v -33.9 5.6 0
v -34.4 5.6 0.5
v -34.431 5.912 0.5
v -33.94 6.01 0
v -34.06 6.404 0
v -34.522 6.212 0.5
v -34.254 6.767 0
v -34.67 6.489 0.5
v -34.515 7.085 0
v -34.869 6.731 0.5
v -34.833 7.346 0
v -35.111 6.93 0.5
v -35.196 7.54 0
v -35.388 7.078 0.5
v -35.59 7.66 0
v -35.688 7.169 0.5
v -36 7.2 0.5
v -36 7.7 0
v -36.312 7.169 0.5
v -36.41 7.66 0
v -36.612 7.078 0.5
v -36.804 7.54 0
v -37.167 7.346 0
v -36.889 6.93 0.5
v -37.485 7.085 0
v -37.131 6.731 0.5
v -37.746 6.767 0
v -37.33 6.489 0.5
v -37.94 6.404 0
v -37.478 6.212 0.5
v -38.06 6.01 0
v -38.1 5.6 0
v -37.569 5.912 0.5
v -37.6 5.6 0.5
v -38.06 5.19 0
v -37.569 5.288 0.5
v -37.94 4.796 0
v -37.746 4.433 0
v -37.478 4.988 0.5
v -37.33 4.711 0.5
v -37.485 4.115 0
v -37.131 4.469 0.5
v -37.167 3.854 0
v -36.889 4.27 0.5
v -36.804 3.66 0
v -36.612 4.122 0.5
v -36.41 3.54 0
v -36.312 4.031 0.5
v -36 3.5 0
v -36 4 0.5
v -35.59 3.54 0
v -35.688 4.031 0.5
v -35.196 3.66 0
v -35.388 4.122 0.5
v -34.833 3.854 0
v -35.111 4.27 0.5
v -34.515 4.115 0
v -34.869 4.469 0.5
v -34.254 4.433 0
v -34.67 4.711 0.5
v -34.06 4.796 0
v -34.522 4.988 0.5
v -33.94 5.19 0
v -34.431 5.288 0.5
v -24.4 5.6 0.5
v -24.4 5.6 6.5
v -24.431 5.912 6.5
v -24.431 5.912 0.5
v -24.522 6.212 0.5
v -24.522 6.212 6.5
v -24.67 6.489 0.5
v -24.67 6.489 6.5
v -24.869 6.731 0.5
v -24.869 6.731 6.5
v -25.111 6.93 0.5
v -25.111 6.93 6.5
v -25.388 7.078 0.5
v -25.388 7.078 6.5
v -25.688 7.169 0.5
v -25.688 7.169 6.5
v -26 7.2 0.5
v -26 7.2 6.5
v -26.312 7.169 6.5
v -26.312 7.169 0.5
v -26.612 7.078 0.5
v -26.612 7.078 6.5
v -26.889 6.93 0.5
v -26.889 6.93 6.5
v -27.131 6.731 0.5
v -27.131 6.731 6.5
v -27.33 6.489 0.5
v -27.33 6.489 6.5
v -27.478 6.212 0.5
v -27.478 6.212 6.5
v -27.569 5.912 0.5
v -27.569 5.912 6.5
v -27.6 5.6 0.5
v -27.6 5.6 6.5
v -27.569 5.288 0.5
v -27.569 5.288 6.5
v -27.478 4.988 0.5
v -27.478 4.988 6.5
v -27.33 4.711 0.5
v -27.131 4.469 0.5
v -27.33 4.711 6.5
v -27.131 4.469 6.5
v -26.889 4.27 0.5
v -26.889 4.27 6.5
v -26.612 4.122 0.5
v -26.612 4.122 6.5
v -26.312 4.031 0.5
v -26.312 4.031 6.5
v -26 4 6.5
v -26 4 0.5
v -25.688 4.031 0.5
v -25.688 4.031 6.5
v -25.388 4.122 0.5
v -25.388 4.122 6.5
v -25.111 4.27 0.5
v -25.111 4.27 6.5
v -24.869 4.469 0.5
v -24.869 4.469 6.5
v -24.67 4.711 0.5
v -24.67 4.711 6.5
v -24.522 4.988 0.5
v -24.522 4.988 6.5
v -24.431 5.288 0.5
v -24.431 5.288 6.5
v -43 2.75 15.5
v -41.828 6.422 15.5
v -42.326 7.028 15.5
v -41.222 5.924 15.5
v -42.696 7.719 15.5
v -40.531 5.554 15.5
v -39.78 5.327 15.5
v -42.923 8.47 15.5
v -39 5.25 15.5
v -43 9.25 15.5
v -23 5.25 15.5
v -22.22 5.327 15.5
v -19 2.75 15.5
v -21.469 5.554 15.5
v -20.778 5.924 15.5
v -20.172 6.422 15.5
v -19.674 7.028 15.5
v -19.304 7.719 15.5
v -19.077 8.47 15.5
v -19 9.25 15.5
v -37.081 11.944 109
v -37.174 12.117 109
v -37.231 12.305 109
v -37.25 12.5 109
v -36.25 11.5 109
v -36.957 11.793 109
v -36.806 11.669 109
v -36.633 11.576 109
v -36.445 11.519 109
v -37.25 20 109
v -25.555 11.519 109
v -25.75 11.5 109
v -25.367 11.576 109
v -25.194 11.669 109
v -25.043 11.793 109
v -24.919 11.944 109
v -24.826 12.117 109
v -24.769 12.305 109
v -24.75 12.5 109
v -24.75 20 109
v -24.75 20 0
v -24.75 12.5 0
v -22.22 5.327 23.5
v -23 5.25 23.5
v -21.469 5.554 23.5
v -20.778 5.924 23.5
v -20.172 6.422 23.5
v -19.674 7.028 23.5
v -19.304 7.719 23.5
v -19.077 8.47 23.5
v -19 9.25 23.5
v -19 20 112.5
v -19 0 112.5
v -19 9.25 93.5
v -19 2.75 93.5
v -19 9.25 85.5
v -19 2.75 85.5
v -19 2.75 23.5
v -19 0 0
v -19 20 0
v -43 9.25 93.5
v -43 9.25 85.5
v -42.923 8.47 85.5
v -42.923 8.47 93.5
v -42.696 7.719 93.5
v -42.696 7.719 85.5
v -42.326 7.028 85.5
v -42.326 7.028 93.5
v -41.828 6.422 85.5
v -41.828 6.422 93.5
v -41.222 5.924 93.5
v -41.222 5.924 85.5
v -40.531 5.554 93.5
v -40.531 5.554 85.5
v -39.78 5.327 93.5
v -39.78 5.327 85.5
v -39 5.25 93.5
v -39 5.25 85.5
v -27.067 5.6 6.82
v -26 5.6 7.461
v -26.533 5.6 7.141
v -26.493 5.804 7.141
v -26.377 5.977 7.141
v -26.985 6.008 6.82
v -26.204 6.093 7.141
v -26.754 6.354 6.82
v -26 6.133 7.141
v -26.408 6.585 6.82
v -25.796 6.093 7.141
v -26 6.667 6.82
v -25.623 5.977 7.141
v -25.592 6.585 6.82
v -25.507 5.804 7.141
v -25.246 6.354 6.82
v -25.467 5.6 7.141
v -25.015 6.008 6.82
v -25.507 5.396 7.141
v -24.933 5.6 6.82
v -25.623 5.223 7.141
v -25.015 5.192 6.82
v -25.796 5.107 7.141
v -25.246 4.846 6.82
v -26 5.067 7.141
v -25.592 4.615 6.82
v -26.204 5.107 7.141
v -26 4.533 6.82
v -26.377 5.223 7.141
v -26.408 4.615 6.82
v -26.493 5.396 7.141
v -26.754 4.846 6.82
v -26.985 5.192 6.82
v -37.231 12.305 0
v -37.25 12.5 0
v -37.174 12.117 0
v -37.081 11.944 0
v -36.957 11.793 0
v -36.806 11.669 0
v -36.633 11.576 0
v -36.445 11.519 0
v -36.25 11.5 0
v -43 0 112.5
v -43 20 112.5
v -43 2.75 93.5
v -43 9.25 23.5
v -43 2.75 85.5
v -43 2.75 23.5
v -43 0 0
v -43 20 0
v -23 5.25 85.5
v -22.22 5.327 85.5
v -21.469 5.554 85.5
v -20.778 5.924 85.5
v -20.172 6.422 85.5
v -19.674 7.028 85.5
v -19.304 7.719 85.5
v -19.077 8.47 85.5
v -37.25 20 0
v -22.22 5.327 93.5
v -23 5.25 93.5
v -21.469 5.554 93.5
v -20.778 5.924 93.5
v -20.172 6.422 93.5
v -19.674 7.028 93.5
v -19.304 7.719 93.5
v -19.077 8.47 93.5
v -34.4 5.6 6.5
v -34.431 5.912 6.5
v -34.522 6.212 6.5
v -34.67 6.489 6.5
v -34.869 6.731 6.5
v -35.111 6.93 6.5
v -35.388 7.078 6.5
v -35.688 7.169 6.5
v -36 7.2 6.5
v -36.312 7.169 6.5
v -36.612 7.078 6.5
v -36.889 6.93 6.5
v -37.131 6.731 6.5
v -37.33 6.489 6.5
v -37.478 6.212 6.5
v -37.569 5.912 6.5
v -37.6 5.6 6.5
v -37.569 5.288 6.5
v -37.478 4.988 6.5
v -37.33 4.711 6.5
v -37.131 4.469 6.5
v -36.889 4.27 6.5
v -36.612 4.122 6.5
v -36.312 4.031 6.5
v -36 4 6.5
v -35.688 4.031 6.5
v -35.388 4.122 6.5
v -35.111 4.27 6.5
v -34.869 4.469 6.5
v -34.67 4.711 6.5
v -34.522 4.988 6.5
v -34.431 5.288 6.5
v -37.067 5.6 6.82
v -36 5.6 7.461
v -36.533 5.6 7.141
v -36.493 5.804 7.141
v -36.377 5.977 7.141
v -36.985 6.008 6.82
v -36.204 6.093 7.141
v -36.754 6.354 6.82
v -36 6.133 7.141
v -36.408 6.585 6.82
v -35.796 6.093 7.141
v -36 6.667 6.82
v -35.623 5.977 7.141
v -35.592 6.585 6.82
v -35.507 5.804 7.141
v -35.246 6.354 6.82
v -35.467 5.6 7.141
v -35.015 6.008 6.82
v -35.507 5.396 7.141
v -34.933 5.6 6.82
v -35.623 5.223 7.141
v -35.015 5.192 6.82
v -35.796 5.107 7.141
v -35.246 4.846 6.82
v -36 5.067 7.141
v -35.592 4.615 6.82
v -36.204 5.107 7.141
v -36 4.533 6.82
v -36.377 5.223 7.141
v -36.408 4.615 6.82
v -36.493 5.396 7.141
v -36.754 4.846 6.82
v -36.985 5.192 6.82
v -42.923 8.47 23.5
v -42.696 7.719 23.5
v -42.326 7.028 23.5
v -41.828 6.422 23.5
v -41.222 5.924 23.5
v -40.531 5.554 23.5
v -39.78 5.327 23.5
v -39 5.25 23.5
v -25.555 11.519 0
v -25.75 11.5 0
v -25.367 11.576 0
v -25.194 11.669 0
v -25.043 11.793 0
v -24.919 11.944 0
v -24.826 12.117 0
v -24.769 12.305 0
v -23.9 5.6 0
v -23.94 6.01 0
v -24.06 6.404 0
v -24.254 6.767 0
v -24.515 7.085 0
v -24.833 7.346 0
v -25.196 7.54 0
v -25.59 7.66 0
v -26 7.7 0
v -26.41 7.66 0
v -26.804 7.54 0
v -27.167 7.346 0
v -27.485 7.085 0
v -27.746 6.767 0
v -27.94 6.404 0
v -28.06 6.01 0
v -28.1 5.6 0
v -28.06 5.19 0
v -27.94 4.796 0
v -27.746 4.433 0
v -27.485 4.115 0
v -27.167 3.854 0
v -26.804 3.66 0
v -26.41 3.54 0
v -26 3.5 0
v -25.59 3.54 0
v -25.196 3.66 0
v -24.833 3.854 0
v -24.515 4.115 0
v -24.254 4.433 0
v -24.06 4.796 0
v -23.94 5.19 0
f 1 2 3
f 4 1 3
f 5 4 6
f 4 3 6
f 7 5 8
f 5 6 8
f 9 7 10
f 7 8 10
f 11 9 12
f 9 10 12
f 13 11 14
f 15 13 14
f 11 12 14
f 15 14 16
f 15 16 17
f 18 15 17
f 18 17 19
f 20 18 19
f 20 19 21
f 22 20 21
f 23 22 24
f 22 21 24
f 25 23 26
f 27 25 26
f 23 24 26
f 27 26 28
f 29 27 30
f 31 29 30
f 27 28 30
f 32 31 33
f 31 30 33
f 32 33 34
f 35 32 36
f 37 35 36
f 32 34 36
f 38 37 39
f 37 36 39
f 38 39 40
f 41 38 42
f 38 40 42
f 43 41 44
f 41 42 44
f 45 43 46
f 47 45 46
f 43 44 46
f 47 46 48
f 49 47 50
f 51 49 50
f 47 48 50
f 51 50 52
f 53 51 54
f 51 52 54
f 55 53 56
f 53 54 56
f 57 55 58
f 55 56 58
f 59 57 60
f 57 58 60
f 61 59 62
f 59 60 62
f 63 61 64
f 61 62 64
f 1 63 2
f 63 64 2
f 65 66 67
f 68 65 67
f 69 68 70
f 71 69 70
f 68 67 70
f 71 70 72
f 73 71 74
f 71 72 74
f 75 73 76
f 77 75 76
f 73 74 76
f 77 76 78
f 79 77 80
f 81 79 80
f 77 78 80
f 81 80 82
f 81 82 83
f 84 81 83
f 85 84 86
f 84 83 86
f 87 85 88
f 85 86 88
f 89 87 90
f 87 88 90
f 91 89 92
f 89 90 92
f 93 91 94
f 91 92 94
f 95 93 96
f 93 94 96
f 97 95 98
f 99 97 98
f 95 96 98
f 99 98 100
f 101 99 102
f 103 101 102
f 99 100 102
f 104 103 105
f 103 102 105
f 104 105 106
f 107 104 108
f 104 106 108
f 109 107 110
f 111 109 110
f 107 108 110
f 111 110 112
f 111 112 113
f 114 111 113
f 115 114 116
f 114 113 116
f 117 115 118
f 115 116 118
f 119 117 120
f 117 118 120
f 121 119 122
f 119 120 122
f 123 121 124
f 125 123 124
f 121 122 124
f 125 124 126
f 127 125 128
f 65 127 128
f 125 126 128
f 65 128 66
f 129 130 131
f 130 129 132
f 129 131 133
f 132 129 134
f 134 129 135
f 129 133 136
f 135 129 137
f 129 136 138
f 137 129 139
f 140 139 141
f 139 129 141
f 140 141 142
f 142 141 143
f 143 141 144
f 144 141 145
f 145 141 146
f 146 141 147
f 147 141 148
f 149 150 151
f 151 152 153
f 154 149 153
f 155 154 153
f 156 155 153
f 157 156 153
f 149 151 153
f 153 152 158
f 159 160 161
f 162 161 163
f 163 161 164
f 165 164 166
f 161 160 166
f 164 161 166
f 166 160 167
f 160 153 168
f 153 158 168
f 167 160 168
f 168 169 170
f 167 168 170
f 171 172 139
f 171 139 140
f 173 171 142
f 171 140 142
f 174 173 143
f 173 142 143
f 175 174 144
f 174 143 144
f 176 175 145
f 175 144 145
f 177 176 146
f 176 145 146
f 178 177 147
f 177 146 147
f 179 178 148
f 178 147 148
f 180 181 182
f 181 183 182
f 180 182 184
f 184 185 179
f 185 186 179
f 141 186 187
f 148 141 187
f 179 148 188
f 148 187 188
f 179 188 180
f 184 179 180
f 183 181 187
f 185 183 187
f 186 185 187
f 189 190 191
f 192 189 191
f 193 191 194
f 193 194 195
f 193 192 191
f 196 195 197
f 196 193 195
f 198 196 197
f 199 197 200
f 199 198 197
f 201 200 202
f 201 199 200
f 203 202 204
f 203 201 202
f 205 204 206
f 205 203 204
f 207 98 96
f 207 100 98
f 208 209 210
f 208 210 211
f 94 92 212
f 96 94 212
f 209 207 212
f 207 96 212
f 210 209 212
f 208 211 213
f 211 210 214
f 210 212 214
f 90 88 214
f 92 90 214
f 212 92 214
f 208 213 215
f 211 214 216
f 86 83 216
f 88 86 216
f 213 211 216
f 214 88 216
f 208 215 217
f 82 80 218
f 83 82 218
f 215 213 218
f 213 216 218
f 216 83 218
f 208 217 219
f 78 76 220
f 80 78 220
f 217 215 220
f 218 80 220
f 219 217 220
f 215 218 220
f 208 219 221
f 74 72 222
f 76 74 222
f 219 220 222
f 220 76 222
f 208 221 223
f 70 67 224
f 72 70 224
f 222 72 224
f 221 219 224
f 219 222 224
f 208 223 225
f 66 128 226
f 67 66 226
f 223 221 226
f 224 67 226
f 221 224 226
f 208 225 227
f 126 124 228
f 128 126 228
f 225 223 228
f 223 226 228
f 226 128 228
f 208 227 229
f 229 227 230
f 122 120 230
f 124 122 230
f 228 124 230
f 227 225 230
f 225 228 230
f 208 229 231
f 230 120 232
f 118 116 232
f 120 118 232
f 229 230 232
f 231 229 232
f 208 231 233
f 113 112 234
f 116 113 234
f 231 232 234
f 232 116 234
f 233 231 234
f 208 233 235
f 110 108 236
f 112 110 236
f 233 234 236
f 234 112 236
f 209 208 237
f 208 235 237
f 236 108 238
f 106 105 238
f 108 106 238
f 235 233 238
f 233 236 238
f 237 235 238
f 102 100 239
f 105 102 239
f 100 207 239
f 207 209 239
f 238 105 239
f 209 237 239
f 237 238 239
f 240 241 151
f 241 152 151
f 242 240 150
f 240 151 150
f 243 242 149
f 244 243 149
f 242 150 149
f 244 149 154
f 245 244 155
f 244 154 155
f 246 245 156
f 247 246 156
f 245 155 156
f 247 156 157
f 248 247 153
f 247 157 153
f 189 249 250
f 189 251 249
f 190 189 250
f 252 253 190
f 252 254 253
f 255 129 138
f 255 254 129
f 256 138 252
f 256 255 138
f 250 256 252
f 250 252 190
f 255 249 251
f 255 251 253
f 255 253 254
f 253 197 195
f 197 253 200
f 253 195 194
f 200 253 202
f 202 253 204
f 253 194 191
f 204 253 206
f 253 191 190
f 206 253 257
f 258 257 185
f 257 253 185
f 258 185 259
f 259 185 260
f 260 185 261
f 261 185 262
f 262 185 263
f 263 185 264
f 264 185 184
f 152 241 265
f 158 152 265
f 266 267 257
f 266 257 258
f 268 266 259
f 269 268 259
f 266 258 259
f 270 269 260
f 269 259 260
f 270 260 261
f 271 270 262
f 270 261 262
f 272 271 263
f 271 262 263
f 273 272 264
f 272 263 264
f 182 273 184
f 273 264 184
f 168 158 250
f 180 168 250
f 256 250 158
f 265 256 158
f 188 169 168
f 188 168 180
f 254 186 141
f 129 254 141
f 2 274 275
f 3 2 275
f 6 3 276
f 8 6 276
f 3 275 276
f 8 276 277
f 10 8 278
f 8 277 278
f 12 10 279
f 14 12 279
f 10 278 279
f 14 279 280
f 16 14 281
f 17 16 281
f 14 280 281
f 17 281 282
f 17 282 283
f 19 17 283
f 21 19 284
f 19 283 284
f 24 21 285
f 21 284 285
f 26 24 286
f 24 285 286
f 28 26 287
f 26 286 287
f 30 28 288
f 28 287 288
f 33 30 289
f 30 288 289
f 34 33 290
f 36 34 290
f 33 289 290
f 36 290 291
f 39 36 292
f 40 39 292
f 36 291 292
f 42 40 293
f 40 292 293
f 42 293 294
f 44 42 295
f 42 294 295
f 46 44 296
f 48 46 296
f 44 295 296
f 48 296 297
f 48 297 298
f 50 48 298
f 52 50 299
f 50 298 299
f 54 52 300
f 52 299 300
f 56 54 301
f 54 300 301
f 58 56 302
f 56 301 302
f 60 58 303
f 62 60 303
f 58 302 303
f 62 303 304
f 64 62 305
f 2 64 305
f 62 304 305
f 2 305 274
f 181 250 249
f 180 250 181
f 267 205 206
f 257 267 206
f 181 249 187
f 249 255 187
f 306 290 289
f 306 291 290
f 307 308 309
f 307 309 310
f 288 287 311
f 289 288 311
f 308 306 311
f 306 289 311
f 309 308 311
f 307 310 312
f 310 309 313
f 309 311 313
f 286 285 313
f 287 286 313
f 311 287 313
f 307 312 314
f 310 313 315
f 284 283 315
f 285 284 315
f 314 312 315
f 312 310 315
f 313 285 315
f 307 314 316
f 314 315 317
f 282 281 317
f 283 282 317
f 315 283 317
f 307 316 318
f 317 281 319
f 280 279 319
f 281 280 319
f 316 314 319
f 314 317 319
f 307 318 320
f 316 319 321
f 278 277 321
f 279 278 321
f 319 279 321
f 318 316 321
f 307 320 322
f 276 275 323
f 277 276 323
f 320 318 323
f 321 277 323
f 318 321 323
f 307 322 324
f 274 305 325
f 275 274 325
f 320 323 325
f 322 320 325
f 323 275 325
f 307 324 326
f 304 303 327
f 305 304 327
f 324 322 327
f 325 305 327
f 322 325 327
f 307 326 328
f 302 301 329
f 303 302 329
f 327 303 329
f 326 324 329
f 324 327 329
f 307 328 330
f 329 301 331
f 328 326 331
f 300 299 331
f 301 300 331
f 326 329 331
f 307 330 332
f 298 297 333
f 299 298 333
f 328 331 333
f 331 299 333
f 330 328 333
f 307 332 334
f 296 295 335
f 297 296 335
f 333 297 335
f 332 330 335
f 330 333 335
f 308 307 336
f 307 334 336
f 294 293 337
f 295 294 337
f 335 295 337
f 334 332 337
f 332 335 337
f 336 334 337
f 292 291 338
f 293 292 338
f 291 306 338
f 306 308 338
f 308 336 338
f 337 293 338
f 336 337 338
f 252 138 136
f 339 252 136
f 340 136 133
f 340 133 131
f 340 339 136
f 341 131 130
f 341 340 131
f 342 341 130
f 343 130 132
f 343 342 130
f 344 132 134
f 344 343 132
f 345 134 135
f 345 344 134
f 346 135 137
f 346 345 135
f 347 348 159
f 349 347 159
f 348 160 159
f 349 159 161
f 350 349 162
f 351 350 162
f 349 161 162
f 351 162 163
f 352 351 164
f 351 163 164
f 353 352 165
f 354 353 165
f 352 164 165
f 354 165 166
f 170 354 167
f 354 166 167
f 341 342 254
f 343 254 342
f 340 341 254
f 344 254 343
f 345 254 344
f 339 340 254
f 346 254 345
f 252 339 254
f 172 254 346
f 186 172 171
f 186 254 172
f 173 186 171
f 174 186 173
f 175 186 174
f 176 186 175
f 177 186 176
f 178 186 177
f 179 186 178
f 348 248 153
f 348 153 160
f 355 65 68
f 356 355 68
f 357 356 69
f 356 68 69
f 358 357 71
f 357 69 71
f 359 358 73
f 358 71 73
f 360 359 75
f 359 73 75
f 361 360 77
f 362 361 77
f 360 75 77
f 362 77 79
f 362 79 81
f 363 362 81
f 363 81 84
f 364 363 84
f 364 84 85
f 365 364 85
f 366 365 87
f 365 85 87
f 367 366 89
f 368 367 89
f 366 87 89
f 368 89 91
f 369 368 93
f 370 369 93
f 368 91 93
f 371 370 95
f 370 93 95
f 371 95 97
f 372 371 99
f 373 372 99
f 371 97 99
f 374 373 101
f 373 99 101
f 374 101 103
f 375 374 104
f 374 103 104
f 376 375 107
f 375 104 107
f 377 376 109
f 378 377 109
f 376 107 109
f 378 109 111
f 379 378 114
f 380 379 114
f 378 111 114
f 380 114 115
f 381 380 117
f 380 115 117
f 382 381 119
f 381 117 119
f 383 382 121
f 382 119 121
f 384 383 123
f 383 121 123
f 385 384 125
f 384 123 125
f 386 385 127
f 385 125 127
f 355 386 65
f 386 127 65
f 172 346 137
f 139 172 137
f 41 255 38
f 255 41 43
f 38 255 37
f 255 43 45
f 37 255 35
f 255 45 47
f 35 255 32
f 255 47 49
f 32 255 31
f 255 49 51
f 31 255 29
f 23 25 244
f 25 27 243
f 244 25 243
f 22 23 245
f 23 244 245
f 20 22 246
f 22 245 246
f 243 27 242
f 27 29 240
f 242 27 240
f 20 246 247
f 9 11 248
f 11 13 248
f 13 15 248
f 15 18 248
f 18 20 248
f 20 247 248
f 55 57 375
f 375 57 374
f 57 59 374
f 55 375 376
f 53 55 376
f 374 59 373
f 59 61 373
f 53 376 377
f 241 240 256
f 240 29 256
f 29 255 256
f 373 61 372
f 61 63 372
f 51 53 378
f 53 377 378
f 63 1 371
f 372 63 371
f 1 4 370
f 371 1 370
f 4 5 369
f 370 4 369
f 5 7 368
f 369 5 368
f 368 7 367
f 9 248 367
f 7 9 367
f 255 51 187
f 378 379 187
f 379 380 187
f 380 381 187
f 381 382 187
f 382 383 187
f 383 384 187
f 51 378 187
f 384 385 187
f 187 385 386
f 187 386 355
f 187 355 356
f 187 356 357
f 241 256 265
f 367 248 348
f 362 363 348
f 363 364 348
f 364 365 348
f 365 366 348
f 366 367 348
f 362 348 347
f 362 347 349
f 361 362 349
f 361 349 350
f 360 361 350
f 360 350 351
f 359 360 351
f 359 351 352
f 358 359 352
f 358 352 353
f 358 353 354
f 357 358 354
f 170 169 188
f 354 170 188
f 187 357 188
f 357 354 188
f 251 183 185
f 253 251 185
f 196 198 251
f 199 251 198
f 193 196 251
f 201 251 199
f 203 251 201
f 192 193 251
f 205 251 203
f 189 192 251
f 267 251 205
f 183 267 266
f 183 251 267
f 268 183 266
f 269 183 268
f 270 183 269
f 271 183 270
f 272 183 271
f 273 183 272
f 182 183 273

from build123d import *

# Parameters (mm, degrees)
SKETCH1_W                 = 12.5
SKETCH1_H                 = 11.5
BOSS_EXTRUDE1_DEPTH       = 109
SKETCH2_W                 = 24
SKETCH2_H                 = 20
BOSS_EXTRUDE2_DEPTH       = 3.5
F_2_5MM_DOWEL_HOLE1_D     = 3.2
F_2_5MM_DOWEL_HOLE1_DEPTH = 6.5
F_2_5MM_DOWEL_HOLE1_TIP   = 0.96137699
SKETCH5_W                 = 8
SKETCH5_H                 = 2.5
CUT_EXTRUDE1_DEPTH        = 117.757226757
FILLET1_R                 = 4
CHAMFER1_SIZE             = 0.5
FILLET2_R                 = 1


with BuildPart() as part:
    # Sketch1 → Boss-Extrude1 (new body)
    with BuildSketch(Plane.XY):
        Polygon((-37.25, 0), (-37.25, 11.5), (-37.25, 20), (-43, 20), (-43, 0), align=None)
        with Locations((-31, 5.75)):
            Rectangle(SKETCH1_W, SKETCH1_H)
        Polygon((-24.75, 20), (-24.75, 11.5), (-24.75, 0), (-19, 0), (-19, 20), align=None)
    extrude(amount=BOSS_EXTRUDE1_DEPTH)

    # Sketch2 → Boss-Extrude2 (add)
    with BuildSketch(Plane.XY.offset(109)):
        with Locations((-31, 10)):
            Rectangle(SKETCH2_W, SKETCH2_H)
    extrude(amount=BOSS_EXTRUDE2_DEPTH)

    # Ø2.5mm Dowel Hole1
    with Locations(Plane(origin=(0, 0, 0), x_dir=(-1, 0, 0), z_dir=(0, 0, -1))):
        with Locations((36, 5.6), (26, 5.6)):
            Hole(F_2_5MM_DOWEL_HOLE1_D / 2, depth=F_2_5MM_DOWEL_HOLE1_DEPTH)
            with Locations((0, 0, -(F_2_5MM_DOWEL_HOLE1_DEPTH + F_2_5MM_DOWEL_HOLE1_TIP / 2))):  # 118° drill point
                Cone(0, F_2_5MM_DOWEL_HOLE1_D / 2, F_2_5MM_DOWEL_HOLE1_TIP, mode=Mode.SUBTRACT)

    # Sketch5 → Cut-Extrude1 (cut, through all)
    with BuildSketch(Plane(origin=(-19, 0, 0), x_dir=(0, 0, -1), z_dir=(1, 0, 0))):
        with Locations((-89.5, 4)):
            Rectangle(SKETCH5_W, SKETCH5_H)
        with Locations((-19.5, 4)):
            Rectangle(SKETCH5_W, SKETCH5_H)
    extrude(amount=-CUT_EXTRUDE1_DEPTH, mode=Mode.SUBTRACT)

    # Fillet1
    fillet1_edges = [part.edges().sort_by_distance(p)[0] for p in [
        (-43, 5.25, 89.5),
        (-19, 5.25, 89.5),
        (-43, 5.25, 19.5),
        (-19, 5.25, 19.5),
    ]]
    fillet(fillet1_edges, radius=FILLET1_R)

    # Chamfer1
    chamfer1_edges = [part.edges().sort_by_distance(p)[0] for p in [
        (-37.6, 5.6, 0),
        (-27.6, 5.6, 0),
    ]]
    chamfer(chamfer1_edges, length=CHAMFER1_SIZE)

    # Fillet2
    fillet2_edges = [part.edges().sort_by_distance(p)[0] for p in [
        (-37.25, 11.5, 54.5),
        (-24.75, 11.5, 54.5),
    ]]
    fillet(fillet2_edges, radius=FILLET2_R)


solid = part.part
